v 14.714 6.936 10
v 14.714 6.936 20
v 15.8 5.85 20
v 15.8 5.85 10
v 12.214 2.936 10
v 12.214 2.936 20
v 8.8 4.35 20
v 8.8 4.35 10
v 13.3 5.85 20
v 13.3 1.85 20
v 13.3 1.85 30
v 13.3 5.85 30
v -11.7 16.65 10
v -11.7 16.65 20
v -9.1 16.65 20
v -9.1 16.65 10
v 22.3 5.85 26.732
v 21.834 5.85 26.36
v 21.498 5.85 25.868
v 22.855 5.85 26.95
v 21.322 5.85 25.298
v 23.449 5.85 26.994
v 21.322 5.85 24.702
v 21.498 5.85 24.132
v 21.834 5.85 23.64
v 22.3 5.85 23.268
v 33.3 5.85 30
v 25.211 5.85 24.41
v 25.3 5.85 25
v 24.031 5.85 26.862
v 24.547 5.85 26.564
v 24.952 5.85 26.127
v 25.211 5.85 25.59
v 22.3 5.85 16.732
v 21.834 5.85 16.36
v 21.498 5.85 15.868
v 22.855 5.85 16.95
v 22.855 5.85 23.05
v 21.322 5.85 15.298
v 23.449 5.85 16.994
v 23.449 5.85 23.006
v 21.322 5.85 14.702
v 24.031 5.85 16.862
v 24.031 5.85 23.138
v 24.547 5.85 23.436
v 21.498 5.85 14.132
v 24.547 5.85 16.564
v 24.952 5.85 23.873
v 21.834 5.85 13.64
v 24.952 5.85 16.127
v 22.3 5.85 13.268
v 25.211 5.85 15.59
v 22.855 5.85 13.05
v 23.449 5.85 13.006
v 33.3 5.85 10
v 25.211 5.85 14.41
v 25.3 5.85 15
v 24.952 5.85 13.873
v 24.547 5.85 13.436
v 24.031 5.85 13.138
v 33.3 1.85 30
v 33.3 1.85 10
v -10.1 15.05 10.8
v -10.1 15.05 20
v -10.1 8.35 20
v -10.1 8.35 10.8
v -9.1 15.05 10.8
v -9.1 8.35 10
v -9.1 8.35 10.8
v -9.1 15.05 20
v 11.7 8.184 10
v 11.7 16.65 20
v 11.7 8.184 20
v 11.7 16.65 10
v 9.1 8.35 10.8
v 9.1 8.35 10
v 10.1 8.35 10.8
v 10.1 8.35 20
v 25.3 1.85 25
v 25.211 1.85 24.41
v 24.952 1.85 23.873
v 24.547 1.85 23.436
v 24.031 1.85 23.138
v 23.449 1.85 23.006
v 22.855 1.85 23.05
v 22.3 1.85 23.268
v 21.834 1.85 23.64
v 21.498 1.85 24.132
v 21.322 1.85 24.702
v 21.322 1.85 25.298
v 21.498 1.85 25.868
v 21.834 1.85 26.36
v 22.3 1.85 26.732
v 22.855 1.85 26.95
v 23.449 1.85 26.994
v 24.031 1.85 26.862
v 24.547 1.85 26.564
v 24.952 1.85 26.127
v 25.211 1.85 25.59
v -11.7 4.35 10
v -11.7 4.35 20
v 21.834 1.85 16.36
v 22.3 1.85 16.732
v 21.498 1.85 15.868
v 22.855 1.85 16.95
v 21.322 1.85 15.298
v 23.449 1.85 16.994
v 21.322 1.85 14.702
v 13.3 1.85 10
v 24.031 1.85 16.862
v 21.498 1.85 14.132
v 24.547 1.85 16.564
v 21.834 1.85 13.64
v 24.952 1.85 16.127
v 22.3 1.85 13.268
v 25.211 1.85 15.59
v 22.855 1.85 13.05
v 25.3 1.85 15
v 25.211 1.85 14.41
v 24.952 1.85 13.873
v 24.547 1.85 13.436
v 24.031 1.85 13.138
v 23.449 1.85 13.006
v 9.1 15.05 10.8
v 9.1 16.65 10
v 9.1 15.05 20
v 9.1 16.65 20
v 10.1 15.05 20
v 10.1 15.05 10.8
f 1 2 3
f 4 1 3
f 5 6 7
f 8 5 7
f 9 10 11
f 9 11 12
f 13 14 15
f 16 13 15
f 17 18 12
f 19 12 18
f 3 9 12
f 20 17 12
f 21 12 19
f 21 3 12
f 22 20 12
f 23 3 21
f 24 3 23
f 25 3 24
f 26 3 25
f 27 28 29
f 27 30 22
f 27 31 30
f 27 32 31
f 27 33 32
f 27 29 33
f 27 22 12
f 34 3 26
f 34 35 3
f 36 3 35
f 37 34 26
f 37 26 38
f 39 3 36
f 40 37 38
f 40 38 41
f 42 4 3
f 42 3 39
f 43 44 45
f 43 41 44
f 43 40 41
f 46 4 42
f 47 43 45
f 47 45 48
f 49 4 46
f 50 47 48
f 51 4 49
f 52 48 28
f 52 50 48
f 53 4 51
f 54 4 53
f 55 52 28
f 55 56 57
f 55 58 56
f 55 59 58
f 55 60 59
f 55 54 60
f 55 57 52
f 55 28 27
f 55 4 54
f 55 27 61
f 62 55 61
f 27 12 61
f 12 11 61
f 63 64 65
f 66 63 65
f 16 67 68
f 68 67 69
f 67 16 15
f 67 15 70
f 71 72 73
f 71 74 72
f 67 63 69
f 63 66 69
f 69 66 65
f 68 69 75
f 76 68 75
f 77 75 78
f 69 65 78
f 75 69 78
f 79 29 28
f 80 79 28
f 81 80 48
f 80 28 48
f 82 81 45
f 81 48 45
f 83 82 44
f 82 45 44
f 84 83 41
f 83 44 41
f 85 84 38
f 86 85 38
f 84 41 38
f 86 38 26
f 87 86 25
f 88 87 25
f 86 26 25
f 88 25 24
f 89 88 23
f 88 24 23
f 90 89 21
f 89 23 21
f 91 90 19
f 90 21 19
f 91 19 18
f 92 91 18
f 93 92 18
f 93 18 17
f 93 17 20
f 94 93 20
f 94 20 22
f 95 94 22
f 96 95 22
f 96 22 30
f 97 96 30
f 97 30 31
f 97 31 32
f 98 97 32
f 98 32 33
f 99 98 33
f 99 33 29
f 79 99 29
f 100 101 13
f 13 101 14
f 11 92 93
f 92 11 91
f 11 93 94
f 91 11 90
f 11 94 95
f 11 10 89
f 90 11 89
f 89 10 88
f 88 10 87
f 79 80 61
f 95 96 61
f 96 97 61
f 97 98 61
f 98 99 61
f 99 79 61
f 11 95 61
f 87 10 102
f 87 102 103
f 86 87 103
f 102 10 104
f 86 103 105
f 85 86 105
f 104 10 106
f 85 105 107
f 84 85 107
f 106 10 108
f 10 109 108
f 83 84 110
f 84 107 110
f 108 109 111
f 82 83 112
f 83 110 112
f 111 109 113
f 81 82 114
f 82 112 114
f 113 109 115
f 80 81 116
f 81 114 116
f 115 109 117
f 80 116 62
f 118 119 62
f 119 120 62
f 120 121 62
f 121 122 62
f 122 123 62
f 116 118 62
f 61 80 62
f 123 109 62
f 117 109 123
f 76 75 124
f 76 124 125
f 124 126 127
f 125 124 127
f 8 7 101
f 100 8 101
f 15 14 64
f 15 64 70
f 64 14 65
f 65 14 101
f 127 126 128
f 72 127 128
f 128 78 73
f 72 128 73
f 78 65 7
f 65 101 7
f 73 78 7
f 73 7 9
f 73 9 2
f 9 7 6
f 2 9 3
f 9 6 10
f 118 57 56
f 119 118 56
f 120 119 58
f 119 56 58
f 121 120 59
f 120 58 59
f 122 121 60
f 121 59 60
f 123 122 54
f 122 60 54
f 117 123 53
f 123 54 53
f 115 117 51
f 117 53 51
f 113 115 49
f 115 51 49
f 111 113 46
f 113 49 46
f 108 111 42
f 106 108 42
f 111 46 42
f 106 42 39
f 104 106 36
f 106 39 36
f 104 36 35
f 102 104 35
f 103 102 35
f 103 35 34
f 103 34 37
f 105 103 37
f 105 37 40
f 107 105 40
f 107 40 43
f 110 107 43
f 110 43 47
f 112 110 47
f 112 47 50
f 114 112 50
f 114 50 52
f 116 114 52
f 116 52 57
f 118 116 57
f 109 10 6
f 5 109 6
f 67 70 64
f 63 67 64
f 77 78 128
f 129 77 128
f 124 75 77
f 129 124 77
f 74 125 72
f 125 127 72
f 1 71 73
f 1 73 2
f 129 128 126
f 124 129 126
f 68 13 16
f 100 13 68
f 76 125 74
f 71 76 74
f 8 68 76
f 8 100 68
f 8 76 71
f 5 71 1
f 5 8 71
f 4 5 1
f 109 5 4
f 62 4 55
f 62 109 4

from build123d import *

# Parameters (mm, degrees)
F0_W        = 20
F0_H        = 2.5
F1_DEPTH    = 9.2
F2_DEPTH    = 10
F3_R        = 2
F4_DEPTH    = 25
F5_W        = 1
F5_H        = 6.7
F6_DEPTH    = 0.8
F7_T1_DEPTH = 10
F7_T6_DEPTH = 20.3706815716
F8_ANGLE    = 180


# Not quite as in the source:
# - a fillet or chamfer that OpenCascade refuses, or shapes differently, is made with other operations: its cross-section is extruded or revolved along the edge and cut away or added


with BuildPart() as f1:
    # F0 (on Top) → F1 (new body)
    with BuildSketch(Plane.XY):
        Polygon((-9.1, -3.35), (-10.1, -3.35), (-10.1, 3.35), (10.1, 3.35), (10.1, -3.35), (9.1, -3.35), (9.1, -4.95), (11.7, -4.95), (11.7, 3.35), (11.7, 7.35), (10.8, 7.35), (-11.7, 7.35), (-11.7, -4.95), (-9.1, -4.95), align=None)
        Polygon((13.3, 7.35), (11.7, 7.35), (11.7, 3.35), (13.3, 3.35), (13.3, 5.85), align=None)
        Polygon((13.3, 9.85), (10.8, 7.35), (11.7, 7.35), (13.3, 7.35), align=None)
        with Locations((23.3, 8.6)):
            Rectangle(F0_W, F0_H)
        Polygon((33.3, 7.35), (13.3, 7.35), (13.3, 5.85), (15.8, 5.85), (33.3, 5.85), align=None)
        Polygon((13.3, 5.85), (13.3, 3.35), (15.8, 5.85), align=None)
    extrude(amount=F1_DEPTH)

    # F0 (on Top) → F2 (join, symmetric)
    with BuildSketch(Plane.XY):
        Polygon((33.3, 7.35), (13.3, 7.35), (13.3, 5.85), (15.8, 5.85), (33.3, 5.85), align=None)
        with Locations((23.3, 8.6)):
            Rectangle(F0_W, F0_H)
    extrude(amount=F2_DEPTH, both=True)

    # F3 (on face) → F4 (cut)
    with BuildSketch(Plane.XZ.offset(-5.85)):
        with Locations((23.3, 5)):
            Circle(F3_R)
        with Locations((23.3, -5)):
            Circle(F3_R)
    extrude(amount=-F4_DEPTH, mode=Mode.SUBTRACT)

    # F5 (on face) → F6 (join, through all)
    with BuildSketch(Plane.XY.offset(9.2)):
        Polygon((-9.1, -4.95), (-9.1, -3.35), (-10.1, -3.35), (-10.1, 3.35), (-9.1, 3.35), (9.1, 3.35), (10.1, 3.35), (10.1, -3.35), (9.1, -3.35), (9.1, -4.95), (11.7, -4.95), (11.7, 3.35), (13.3, 3.35), (15.8, 5.85), (13.3, 5.85), (13.3, 9.85), (10.8, 7.35), (-11.7, 7.35), (-11.7, -4.95), align=None)
        with Locations((-9.6, 0)):
            Rectangle(F5_W, F5_H)
        with Locations((9.6, 0)):
            Rectangle(F5_W, F5_H)
    extrude(amount=F6_DEPTH)

    # F7: chamfer of 2 on 2 edges, made by hand

    # F7_s2 → F7_t1 (join)
    with BuildSketch(Plane.XY):
        Polygon((12.2142135624, 8.7642135624), (8.8, 7.35), (10.8, 7.35), align=None)
    extrude(amount=F7_T1_DEPTH)


with BuildPart() as f7_tool4:
    # F7_s5 → F7_t6 (new body)
    with BuildSketch(Plane.XY.offset(15.1853407858)):
        Polygon((11.3, 3.35), (14.7142135624, 4.7642135624), (13.3, 3.35), align=None)
    extrude(amount=-F7_T6_DEPTH)

    split(bisect_by=Plane.YZ.offset(11.7), keep=Keep.TOP)


with BuildPart() as f1_1:
    add(f1.part)

    # F7_t3: cut F7_tool4
    add(f7_tool4.part, mode=Mode.SUBTRACT)


with BuildPart() as f1_2:
    # F8: moved
    add(f1_1.part.rotate(Axis((24.55, 5.85, 10), (1, 0, 0)), F8_ANGLE))


solid = f1_2.part
